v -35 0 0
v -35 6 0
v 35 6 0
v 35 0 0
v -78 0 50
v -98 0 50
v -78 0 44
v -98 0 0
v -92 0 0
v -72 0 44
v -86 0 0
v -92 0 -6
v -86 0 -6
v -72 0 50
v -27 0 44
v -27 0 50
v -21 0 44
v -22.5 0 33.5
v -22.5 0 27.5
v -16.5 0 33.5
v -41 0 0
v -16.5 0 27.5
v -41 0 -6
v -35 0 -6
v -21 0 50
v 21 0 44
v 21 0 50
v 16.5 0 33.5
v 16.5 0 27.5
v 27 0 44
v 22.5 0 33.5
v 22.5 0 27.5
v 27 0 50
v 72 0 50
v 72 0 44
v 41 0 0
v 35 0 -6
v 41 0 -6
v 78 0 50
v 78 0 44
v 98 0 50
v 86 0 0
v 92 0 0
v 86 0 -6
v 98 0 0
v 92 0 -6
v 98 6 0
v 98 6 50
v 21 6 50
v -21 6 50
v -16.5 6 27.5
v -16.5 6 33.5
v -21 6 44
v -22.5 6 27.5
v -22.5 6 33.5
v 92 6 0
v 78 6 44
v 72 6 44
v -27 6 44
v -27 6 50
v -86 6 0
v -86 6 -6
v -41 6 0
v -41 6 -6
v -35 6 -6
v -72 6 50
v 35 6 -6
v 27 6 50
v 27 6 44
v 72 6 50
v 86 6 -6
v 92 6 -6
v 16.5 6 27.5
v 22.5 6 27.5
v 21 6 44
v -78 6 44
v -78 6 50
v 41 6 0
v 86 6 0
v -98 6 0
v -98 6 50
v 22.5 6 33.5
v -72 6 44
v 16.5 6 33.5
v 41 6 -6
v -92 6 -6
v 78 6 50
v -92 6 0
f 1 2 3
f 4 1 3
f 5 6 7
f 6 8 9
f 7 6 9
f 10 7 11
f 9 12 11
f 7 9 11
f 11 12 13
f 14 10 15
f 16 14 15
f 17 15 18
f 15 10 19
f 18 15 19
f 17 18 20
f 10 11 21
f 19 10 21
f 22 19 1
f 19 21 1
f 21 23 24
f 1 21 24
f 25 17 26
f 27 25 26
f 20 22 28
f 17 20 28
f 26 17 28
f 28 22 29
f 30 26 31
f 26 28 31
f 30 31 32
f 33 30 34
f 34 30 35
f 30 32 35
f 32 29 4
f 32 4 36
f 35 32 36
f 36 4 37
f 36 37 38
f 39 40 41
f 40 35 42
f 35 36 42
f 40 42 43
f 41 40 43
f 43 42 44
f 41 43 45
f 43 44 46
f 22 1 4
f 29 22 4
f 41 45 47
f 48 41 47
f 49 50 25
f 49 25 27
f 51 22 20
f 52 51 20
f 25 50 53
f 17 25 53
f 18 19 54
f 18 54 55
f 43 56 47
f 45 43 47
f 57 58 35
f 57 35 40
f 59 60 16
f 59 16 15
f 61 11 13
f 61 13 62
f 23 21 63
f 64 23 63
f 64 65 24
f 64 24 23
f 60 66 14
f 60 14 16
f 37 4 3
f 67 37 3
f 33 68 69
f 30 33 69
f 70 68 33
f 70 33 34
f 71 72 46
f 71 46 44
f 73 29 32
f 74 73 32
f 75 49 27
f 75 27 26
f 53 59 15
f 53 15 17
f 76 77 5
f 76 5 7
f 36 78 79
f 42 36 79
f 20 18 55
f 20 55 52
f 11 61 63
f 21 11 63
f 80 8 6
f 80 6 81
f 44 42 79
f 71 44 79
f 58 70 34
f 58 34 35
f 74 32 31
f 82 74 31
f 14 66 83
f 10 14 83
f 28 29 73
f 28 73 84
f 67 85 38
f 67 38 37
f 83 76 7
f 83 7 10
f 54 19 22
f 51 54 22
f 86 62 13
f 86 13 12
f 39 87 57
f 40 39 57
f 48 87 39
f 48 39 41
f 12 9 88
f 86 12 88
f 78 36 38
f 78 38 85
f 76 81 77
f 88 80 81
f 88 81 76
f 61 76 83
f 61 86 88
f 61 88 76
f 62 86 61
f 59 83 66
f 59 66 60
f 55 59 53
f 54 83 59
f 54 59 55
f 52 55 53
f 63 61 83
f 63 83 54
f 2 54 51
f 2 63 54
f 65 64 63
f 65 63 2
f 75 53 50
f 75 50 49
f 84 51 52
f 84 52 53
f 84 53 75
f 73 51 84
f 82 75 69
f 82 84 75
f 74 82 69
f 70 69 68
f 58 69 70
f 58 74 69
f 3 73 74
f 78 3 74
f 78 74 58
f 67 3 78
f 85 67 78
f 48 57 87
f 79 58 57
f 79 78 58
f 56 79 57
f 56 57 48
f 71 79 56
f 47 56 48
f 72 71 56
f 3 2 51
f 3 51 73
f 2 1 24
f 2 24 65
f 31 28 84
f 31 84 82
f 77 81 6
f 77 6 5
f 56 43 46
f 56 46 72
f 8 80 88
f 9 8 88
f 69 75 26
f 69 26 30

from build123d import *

# Parameters (mm, degrees)
SKETCH1_W           = 196
SKETCH1_H           = 6
BOSS_EXTRUDE1_DEPTH = 50
SKETCH2_W           = 6
SKETCH2_H           = 6
BOSS_EXTRUDE2_DEPTH = 6
SKETCH3_W           = 6
SKETCH3_H           = 6
CUT_EXTRUDE1_DEPTH  = 6
SKETCH5_W           = 6
SKETCH5_H           = 6
CUT_EXTRUDE2_DEPTH  = 6


with BuildPart() as part:
    # Sketch1 → Boss-Extrude1 (new body)
    with BuildSketch(Plane.XY):
        with Locations((0, 3)):
            Rectangle(SKETCH1_W, SKETCH1_H)
    extrude(amount=BOSS_EXTRUDE1_DEPTH)

    # Sketch2 → Boss-Extrude2 (add)
    with BuildSketch(Plane(origin=(0, 0, 0), x_dir=(-1, 0, 0), z_dir=(0, 0, -1))):
        with Locations((-89, 3)):
            Rectangle(SKETCH2_W, SKETCH2_H)
        with Locations((-38, 3)):
            Rectangle(SKETCH2_W, SKETCH2_H)
        with Locations((38, 3)):
            Rectangle(SKETCH2_W, SKETCH2_H)
        with Locations((89, 3)):
            Rectangle(SKETCH2_W, SKETCH2_H)
    extrude(amount=BOSS_EXTRUDE2_DEPTH)

    # Sketch3 → Cut-Extrude1 (cut)
    with BuildSketch(Plane(origin=(0, 6, 0), x_dir=(1, 0, 0), z_dir=(0, 1, 0))):
        with Locations((75, -47)):
            Rectangle(SKETCH3_W, SKETCH3_H)
        with Locations((24, -47)):
            Rectangle(SKETCH3_W, SKETCH3_H)
        with Locations((-24, -47)):
            Rectangle(SKETCH3_W, SKETCH3_H)
        with Locations((-75, -47)):
            Rectangle(SKETCH3_W, SKETCH3_H)
    extrude(amount=-CUT_EXTRUDE1_DEPTH, mode=Mode.SUBTRACT)

    # Sketch5 → Cut-Extrude2 (cut)
    with BuildSketch(Plane.XZ):
        with Locations((-19.5, 30.5)):
            Rectangle(SKETCH5_W, SKETCH5_H)
        with Locations((19.5, 30.5)):
            Rectangle(SKETCH5_W, SKETCH5_H)
    extrude(amount=-CUT_EXTRUDE2_DEPTH, mode=Mode.SUBTRACT)


solid = part.part
